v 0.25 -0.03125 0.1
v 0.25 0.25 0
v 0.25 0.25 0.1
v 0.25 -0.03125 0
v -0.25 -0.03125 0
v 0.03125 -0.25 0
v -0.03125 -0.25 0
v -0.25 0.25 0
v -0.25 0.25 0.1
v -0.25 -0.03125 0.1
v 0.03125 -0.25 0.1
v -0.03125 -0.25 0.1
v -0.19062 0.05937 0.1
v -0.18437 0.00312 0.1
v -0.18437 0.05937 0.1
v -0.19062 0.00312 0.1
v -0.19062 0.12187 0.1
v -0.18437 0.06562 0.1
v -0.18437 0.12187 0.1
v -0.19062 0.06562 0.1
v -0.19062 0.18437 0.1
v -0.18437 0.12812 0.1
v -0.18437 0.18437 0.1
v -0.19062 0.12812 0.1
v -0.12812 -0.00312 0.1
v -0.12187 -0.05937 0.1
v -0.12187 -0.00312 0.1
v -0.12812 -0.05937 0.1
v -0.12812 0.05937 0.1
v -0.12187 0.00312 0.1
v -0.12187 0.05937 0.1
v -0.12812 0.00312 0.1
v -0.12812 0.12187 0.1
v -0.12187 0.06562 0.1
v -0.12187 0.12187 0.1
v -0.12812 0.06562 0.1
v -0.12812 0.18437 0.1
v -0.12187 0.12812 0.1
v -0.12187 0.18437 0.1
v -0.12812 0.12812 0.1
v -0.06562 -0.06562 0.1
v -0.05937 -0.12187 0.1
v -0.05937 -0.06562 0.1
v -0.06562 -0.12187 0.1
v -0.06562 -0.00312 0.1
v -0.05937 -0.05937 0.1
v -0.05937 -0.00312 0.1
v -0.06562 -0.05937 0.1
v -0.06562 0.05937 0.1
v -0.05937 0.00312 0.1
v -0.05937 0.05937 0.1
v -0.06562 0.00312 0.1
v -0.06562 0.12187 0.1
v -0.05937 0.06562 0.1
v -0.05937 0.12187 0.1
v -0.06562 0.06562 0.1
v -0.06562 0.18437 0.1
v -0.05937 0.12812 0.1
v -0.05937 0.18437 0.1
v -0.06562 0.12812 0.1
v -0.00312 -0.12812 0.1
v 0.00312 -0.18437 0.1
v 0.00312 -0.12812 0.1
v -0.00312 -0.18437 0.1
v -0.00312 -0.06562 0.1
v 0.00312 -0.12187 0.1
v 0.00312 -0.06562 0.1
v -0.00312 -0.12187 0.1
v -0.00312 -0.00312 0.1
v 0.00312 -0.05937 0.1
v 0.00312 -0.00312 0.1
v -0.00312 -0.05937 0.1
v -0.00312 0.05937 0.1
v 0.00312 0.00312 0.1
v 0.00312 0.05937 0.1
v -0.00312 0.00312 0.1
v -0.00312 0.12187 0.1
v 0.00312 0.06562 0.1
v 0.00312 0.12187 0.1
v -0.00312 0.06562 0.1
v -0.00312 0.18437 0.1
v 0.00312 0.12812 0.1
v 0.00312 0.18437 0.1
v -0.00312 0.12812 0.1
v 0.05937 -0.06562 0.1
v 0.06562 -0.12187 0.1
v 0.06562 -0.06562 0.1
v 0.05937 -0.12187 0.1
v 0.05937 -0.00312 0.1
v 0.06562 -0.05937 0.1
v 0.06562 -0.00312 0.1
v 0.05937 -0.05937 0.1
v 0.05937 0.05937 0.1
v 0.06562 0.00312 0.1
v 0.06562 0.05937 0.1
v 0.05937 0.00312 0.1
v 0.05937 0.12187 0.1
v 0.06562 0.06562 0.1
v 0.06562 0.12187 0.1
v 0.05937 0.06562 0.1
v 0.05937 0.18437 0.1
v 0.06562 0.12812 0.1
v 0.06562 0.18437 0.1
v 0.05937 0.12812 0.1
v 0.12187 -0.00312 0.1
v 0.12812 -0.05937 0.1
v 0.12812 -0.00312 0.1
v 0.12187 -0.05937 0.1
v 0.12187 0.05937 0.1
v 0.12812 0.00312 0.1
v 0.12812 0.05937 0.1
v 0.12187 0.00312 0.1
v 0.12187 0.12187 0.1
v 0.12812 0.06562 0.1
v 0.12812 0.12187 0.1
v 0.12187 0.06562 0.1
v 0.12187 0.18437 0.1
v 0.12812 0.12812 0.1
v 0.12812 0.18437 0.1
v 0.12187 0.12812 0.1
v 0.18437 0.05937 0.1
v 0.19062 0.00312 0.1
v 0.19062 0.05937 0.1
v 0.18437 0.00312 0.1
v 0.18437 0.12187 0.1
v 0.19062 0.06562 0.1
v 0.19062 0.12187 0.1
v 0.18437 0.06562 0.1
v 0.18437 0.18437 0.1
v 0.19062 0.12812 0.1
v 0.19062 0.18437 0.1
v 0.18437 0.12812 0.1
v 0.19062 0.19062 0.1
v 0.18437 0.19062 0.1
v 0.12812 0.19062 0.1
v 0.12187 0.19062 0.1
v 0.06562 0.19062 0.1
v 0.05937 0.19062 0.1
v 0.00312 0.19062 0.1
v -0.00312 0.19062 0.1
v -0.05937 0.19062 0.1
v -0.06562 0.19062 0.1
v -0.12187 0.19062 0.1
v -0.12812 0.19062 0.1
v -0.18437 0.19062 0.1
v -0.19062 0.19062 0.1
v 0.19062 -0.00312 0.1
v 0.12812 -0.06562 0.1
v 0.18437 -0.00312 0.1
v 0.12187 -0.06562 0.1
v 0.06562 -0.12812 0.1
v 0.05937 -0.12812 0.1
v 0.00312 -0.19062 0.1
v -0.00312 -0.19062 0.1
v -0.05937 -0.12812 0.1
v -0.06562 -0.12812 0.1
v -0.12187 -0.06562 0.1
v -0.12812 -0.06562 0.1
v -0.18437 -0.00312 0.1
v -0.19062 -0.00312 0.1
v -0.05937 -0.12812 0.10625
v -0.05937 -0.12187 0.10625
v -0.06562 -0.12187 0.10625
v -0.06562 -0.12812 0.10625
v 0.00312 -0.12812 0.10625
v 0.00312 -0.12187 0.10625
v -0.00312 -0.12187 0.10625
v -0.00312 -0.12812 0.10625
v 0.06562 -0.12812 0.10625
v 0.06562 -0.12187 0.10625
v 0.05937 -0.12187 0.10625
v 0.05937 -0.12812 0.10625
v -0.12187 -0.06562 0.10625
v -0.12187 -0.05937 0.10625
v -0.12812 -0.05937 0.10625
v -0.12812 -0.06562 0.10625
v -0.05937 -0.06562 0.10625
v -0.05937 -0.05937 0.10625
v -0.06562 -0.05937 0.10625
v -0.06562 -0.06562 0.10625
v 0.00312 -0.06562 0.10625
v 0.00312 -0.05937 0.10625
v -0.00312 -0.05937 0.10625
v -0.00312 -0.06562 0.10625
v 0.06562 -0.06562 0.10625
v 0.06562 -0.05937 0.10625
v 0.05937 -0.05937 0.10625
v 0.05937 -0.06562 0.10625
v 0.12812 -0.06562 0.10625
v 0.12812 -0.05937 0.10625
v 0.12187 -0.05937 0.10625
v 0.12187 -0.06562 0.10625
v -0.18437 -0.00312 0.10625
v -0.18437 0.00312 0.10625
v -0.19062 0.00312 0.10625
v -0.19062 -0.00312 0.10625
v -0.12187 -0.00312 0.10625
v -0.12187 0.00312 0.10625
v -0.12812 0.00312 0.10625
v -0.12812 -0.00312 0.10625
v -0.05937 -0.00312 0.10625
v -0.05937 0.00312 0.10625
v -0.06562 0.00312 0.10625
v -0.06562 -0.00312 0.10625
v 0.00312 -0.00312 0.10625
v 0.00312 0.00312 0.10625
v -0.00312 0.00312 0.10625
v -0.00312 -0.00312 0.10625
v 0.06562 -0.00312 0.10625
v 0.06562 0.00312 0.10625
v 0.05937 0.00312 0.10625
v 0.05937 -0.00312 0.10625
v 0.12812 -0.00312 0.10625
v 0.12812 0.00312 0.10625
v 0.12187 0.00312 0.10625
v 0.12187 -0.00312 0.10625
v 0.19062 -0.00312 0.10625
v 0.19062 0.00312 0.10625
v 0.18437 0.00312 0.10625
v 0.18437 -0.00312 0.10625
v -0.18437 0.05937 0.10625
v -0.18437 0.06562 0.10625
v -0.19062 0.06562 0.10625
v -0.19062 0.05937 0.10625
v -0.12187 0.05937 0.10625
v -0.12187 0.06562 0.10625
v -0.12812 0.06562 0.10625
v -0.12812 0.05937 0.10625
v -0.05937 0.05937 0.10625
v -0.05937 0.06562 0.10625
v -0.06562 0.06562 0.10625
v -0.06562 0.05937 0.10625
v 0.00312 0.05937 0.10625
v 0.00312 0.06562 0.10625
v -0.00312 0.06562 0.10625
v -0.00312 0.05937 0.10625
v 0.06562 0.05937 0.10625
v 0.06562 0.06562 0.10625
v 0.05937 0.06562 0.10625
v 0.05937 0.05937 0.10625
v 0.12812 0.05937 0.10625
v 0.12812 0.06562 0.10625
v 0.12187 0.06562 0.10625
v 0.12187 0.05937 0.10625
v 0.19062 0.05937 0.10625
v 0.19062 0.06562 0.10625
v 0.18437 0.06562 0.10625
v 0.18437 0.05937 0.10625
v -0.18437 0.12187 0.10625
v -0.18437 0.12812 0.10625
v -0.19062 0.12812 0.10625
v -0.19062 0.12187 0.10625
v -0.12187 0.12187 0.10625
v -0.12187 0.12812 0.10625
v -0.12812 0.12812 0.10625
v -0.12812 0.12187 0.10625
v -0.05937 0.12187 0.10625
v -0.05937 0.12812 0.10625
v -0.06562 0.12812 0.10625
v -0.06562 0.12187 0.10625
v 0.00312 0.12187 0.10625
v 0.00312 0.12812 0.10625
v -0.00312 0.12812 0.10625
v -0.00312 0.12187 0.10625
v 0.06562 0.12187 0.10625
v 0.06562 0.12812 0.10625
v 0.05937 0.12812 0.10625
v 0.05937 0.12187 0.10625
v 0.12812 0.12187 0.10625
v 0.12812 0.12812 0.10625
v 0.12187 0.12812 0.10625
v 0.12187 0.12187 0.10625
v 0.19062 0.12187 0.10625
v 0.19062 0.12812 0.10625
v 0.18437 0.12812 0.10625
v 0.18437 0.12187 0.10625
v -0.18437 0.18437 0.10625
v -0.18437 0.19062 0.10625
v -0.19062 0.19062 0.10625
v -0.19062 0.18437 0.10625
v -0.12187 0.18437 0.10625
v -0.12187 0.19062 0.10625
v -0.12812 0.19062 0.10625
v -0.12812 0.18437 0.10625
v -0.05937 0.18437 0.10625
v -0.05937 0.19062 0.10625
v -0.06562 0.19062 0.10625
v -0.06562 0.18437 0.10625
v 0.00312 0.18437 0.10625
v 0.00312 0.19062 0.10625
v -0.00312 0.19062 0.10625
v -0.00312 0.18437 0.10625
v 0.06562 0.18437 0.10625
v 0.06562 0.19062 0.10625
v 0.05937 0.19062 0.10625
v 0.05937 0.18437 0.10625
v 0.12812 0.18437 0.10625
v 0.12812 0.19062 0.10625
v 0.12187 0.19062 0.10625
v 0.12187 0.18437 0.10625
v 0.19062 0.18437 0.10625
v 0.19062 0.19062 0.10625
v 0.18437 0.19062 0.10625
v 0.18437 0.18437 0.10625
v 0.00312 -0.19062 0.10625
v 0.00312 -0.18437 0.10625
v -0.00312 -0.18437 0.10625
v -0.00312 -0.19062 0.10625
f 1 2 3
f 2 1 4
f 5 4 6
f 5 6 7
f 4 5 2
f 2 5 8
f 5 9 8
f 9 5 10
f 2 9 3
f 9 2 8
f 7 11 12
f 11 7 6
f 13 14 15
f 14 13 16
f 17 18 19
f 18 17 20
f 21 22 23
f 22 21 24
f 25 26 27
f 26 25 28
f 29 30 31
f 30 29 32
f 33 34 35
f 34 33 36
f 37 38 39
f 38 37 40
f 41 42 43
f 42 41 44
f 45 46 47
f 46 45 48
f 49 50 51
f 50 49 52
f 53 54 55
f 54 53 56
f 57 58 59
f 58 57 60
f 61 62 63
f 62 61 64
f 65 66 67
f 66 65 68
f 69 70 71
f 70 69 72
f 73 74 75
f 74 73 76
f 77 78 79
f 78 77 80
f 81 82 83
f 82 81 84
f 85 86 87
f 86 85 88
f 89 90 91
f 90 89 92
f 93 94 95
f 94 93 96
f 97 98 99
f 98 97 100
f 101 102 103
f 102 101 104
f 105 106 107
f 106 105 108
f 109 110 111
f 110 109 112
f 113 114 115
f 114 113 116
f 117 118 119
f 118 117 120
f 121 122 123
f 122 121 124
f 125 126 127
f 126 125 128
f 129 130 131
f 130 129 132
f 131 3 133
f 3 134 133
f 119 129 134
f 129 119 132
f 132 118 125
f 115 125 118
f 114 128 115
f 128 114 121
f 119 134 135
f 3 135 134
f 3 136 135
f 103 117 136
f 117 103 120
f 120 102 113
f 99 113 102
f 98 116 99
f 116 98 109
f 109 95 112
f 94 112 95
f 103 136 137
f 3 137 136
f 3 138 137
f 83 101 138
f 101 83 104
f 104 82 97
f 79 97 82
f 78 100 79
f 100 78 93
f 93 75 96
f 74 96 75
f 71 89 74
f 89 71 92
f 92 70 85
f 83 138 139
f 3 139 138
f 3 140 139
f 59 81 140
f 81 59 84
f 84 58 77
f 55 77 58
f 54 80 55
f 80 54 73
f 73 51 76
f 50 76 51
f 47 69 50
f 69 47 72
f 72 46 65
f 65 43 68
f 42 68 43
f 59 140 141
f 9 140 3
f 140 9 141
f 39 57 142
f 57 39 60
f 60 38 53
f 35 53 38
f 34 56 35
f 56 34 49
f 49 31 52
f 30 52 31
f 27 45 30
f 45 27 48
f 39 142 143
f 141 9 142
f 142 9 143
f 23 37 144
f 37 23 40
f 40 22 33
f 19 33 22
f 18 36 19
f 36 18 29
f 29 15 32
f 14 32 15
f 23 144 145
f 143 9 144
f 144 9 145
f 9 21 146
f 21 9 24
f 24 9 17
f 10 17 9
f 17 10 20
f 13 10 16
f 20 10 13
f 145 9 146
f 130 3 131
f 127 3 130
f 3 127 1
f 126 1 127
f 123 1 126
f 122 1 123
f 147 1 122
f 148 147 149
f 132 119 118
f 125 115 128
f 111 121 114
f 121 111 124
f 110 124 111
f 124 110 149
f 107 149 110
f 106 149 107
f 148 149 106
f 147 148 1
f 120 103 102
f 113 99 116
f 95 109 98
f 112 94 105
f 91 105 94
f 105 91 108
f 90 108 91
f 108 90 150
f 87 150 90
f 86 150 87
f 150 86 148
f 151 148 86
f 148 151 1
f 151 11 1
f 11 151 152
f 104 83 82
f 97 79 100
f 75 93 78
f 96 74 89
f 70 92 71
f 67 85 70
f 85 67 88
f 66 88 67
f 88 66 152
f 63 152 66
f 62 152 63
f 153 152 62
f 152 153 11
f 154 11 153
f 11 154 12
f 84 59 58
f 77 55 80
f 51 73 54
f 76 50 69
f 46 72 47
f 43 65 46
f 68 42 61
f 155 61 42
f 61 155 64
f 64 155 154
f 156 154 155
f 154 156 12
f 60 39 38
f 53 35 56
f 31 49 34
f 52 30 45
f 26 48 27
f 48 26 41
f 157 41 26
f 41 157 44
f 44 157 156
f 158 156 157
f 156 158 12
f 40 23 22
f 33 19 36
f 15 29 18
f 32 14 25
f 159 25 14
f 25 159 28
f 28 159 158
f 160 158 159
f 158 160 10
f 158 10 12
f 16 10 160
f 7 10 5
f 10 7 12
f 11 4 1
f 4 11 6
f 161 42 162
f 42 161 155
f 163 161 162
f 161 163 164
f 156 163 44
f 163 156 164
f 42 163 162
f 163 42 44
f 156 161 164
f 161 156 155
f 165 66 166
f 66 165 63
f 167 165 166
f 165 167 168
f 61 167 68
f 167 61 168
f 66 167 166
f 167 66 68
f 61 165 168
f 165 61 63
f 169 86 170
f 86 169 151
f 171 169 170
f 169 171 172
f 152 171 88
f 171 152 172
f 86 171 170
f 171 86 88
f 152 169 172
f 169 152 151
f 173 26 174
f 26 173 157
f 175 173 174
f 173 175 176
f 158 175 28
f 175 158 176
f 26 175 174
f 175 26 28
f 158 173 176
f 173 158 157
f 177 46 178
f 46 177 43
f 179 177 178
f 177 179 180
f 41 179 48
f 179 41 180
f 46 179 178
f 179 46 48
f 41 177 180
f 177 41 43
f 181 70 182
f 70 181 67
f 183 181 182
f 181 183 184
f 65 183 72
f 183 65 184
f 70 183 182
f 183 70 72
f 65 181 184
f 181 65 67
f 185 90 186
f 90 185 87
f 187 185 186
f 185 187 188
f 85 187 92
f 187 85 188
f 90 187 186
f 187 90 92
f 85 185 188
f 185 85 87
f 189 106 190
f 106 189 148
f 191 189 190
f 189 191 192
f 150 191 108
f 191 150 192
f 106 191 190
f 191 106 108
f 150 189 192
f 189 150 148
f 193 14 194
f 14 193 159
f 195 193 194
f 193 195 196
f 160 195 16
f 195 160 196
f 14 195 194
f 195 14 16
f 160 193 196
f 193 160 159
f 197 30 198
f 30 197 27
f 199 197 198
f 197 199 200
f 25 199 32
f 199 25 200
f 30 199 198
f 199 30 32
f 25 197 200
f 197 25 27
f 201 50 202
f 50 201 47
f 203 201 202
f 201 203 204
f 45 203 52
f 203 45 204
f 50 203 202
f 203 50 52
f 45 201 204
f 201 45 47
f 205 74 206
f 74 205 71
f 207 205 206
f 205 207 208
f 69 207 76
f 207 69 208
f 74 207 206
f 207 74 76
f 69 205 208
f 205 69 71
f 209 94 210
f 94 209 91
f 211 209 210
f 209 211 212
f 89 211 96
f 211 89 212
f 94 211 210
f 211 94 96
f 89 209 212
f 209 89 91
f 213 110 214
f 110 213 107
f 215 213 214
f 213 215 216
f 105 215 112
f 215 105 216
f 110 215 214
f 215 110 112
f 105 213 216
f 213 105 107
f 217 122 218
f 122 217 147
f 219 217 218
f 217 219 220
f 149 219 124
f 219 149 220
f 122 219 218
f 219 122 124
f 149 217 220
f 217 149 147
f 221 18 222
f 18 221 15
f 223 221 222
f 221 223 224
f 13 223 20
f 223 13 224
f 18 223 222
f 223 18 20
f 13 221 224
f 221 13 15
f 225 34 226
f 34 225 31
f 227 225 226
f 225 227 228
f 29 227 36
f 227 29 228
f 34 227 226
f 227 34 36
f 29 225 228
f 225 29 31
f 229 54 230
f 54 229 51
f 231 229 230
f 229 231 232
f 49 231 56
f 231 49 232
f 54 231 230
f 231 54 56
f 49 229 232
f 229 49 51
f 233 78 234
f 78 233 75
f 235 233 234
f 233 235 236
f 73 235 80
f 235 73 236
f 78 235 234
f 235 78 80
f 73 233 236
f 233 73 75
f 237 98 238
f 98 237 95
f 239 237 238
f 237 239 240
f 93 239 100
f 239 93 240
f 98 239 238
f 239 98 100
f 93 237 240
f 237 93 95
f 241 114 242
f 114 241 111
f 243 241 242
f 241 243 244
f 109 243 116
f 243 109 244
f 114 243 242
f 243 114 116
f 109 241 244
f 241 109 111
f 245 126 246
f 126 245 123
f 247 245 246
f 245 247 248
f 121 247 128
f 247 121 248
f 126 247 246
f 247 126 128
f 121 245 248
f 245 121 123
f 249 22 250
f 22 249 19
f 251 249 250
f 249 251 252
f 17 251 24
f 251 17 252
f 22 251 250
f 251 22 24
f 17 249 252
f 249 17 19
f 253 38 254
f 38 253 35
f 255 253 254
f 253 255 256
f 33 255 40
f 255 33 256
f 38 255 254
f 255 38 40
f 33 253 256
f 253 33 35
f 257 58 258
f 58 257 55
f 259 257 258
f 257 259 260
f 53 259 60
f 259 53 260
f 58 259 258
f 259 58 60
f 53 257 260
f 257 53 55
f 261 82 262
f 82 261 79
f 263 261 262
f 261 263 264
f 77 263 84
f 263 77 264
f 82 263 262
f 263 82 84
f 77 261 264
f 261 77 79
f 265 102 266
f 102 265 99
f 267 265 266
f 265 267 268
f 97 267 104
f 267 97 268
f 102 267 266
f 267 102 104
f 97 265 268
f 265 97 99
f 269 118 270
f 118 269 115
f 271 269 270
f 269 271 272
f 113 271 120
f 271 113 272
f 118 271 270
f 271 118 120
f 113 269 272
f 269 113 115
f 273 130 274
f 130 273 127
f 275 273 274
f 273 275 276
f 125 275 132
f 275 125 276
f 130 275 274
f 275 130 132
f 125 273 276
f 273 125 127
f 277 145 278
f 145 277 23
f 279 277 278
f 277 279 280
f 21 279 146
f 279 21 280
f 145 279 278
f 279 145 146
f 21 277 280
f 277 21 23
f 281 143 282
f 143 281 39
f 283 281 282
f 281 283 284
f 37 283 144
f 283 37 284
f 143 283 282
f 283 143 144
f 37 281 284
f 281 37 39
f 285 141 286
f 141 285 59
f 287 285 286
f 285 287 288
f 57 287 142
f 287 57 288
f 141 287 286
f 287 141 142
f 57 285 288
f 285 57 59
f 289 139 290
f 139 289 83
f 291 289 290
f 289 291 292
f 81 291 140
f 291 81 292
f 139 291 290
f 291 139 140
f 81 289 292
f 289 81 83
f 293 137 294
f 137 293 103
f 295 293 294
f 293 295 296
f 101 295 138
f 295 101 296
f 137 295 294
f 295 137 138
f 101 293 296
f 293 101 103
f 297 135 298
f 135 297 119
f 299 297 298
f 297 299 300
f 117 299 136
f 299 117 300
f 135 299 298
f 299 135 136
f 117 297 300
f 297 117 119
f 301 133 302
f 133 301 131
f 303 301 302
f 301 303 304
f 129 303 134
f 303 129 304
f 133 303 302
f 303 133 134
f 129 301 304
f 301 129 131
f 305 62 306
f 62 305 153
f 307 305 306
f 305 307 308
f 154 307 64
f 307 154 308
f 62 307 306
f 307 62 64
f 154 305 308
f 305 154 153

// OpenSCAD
smallGridSize = 0.5;
gridSize = smallGridSize / 8;
boardOffset = 0.10;
dotSize = gridSize * 0.1;

difference() {
  translate([0, 0, smallGridSize/4])
    cube(size=[smallGridSize, smallGridSize, smallGridSize/2], center=true);
  translate([0, 0, boardOffset]) translate([0, 0, smallGridSize/2])
    cube(size=[smallGridSize*2, smallGridSize*2, smallGridSize], center=true);
  translate([-gridSize/2, -smallGridSize/2, 0]) rotate([0,0,-45]) translate([0,-smallGridSize,0])
    cube(size=[smallGridSize*2, smallGridSize*2, smallGridSize], center=true);
  translate([gridSize/2, -smallGridSize/2, 0]) rotate([0,0,45]) translate([0,-smallGridSize,0])
    cube(size=[smallGridSize*2, smallGridSize*2, smallGridSize], center=true);
}
for (y=[-3:3]) {
  wid = min(3+y, 3);
  for (x=[-wid:wid]) translate([x*gridSize, y*gridSize, boardOffset])
    cube([dotSize, dotSize, dotSize*2], center=true);
}
